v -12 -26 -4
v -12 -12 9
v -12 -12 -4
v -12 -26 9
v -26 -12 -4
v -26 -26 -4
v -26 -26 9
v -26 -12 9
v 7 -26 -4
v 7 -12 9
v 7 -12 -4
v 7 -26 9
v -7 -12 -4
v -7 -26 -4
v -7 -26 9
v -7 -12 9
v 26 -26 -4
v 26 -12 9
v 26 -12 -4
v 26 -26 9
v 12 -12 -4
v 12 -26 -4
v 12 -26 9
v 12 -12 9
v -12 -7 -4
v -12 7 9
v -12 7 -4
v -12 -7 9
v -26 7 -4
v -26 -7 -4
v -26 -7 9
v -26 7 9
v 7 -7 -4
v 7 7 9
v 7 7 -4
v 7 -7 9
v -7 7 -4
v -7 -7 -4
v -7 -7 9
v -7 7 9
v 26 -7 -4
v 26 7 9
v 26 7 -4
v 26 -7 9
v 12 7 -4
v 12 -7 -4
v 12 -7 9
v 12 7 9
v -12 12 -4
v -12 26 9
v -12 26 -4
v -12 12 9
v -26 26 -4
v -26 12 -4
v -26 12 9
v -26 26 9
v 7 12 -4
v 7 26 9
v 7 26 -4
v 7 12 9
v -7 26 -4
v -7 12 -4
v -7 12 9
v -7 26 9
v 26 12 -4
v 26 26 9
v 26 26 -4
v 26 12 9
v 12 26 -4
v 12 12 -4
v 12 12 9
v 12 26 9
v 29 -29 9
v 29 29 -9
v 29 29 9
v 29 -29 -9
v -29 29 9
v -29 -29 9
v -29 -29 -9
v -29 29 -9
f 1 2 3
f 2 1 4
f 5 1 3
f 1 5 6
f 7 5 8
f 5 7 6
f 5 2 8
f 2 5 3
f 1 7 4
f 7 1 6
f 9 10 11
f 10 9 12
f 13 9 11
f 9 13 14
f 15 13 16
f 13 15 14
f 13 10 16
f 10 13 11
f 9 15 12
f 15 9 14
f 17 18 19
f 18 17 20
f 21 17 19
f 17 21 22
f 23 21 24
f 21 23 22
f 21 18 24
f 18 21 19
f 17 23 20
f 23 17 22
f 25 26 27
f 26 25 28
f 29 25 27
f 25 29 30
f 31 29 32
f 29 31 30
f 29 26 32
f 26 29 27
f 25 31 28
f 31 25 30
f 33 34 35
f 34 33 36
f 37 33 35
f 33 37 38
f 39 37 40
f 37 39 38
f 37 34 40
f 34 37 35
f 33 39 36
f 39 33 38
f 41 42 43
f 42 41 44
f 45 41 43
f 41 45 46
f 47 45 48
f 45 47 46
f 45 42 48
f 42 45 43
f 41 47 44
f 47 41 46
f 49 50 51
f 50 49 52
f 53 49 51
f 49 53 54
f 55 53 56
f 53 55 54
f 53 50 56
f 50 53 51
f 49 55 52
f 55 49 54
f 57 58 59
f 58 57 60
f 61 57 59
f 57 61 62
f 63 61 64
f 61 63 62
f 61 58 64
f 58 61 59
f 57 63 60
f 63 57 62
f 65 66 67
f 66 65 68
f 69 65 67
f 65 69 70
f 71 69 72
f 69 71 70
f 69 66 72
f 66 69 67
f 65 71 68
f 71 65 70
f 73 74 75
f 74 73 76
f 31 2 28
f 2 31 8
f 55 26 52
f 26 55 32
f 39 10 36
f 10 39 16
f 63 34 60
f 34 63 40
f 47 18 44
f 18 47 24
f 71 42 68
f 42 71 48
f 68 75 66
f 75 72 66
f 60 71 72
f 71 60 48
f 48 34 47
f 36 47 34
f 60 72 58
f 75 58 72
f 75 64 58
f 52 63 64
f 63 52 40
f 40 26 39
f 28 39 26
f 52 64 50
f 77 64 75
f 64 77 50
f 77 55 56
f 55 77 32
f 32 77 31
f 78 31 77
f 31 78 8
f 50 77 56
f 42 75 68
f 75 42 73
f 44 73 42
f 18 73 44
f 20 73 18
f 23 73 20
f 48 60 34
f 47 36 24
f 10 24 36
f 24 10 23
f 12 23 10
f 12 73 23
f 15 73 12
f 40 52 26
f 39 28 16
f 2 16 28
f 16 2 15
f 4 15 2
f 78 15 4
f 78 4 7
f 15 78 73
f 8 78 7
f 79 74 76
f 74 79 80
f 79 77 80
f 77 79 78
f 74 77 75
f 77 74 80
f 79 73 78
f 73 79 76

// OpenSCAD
$fn = 32;

// ----------------------------------------------------------------------
// Pocket plate 58 x 58 x 18
// 3 x 3 pockets 14 mm square, 13 mm deep
// ----------------------------------------------------------------------

// --- parameters (mm) ---
thickness = 18;  // plate thickness
floor_t = 5;     // material left under each pocket
pocket = 14;     // pocket side length
pitch_x = 19;    // pocket pitch along X
pitch_y = 19;    // pocket pitch along Y
cols = 3;        // pockets per row
rows = 3;        // rows of pockets

// --- derived feature positions (mm) ---
depth = thickness - floor_t;        // = 13   pocket depth, down to the floor
span_x = (cols - 1) * pitch_x;      // = 38   distance between outer pockets
span_y = (rows - 1) * pitch_y;      // = 38   distance between outer pocket rows
origin_x = -span_x / 2;             // = -19   X of the first pocket
origin_y = -span_y / 2;             // = -19   Y of the first pocket
plate = [span_x + pocket + 6, span_y + pocket + 6, thickness];  // = [58, 58, 18]   overall size: pockets plus 3 mm of wall on each side
feature_centers = [
  [origin_x + 0 * pitch_x, origin_y + 0 * pitch_y],
  [origin_x + 1 * pitch_x, origin_y + 0 * pitch_y],
  [origin_x + 2 * pitch_x, origin_y + 0 * pitch_y],
  [origin_x + 0 * pitch_x, origin_y + 1 * pitch_y],
  [origin_x + 1 * pitch_x, origin_y + 1 * pitch_y],
  [origin_x + 2 * pitch_x, origin_y + 1 * pitch_y],
  [origin_x + 0 * pitch_x, origin_y + 2 * pitch_y],
  [origin_x + 1 * pitch_x, origin_y + 2 * pitch_y],
  [origin_x + 2 * pitch_x, origin_y + 2 * pitch_y]
];   // pocket centres, used verbatim by the cutter loop

// plate outline, then one pocket per centre in feature_centers
difference() {
  cube(plate, center = true);
  for (centre = feature_centers)
    translate([centre[0] - pocket / 2, centre[1] - pocket / 2, plate[2] / 2 - depth])
      cube([pocket, pocket, depth + 1]);  // centred on the declared pocket centre
}
